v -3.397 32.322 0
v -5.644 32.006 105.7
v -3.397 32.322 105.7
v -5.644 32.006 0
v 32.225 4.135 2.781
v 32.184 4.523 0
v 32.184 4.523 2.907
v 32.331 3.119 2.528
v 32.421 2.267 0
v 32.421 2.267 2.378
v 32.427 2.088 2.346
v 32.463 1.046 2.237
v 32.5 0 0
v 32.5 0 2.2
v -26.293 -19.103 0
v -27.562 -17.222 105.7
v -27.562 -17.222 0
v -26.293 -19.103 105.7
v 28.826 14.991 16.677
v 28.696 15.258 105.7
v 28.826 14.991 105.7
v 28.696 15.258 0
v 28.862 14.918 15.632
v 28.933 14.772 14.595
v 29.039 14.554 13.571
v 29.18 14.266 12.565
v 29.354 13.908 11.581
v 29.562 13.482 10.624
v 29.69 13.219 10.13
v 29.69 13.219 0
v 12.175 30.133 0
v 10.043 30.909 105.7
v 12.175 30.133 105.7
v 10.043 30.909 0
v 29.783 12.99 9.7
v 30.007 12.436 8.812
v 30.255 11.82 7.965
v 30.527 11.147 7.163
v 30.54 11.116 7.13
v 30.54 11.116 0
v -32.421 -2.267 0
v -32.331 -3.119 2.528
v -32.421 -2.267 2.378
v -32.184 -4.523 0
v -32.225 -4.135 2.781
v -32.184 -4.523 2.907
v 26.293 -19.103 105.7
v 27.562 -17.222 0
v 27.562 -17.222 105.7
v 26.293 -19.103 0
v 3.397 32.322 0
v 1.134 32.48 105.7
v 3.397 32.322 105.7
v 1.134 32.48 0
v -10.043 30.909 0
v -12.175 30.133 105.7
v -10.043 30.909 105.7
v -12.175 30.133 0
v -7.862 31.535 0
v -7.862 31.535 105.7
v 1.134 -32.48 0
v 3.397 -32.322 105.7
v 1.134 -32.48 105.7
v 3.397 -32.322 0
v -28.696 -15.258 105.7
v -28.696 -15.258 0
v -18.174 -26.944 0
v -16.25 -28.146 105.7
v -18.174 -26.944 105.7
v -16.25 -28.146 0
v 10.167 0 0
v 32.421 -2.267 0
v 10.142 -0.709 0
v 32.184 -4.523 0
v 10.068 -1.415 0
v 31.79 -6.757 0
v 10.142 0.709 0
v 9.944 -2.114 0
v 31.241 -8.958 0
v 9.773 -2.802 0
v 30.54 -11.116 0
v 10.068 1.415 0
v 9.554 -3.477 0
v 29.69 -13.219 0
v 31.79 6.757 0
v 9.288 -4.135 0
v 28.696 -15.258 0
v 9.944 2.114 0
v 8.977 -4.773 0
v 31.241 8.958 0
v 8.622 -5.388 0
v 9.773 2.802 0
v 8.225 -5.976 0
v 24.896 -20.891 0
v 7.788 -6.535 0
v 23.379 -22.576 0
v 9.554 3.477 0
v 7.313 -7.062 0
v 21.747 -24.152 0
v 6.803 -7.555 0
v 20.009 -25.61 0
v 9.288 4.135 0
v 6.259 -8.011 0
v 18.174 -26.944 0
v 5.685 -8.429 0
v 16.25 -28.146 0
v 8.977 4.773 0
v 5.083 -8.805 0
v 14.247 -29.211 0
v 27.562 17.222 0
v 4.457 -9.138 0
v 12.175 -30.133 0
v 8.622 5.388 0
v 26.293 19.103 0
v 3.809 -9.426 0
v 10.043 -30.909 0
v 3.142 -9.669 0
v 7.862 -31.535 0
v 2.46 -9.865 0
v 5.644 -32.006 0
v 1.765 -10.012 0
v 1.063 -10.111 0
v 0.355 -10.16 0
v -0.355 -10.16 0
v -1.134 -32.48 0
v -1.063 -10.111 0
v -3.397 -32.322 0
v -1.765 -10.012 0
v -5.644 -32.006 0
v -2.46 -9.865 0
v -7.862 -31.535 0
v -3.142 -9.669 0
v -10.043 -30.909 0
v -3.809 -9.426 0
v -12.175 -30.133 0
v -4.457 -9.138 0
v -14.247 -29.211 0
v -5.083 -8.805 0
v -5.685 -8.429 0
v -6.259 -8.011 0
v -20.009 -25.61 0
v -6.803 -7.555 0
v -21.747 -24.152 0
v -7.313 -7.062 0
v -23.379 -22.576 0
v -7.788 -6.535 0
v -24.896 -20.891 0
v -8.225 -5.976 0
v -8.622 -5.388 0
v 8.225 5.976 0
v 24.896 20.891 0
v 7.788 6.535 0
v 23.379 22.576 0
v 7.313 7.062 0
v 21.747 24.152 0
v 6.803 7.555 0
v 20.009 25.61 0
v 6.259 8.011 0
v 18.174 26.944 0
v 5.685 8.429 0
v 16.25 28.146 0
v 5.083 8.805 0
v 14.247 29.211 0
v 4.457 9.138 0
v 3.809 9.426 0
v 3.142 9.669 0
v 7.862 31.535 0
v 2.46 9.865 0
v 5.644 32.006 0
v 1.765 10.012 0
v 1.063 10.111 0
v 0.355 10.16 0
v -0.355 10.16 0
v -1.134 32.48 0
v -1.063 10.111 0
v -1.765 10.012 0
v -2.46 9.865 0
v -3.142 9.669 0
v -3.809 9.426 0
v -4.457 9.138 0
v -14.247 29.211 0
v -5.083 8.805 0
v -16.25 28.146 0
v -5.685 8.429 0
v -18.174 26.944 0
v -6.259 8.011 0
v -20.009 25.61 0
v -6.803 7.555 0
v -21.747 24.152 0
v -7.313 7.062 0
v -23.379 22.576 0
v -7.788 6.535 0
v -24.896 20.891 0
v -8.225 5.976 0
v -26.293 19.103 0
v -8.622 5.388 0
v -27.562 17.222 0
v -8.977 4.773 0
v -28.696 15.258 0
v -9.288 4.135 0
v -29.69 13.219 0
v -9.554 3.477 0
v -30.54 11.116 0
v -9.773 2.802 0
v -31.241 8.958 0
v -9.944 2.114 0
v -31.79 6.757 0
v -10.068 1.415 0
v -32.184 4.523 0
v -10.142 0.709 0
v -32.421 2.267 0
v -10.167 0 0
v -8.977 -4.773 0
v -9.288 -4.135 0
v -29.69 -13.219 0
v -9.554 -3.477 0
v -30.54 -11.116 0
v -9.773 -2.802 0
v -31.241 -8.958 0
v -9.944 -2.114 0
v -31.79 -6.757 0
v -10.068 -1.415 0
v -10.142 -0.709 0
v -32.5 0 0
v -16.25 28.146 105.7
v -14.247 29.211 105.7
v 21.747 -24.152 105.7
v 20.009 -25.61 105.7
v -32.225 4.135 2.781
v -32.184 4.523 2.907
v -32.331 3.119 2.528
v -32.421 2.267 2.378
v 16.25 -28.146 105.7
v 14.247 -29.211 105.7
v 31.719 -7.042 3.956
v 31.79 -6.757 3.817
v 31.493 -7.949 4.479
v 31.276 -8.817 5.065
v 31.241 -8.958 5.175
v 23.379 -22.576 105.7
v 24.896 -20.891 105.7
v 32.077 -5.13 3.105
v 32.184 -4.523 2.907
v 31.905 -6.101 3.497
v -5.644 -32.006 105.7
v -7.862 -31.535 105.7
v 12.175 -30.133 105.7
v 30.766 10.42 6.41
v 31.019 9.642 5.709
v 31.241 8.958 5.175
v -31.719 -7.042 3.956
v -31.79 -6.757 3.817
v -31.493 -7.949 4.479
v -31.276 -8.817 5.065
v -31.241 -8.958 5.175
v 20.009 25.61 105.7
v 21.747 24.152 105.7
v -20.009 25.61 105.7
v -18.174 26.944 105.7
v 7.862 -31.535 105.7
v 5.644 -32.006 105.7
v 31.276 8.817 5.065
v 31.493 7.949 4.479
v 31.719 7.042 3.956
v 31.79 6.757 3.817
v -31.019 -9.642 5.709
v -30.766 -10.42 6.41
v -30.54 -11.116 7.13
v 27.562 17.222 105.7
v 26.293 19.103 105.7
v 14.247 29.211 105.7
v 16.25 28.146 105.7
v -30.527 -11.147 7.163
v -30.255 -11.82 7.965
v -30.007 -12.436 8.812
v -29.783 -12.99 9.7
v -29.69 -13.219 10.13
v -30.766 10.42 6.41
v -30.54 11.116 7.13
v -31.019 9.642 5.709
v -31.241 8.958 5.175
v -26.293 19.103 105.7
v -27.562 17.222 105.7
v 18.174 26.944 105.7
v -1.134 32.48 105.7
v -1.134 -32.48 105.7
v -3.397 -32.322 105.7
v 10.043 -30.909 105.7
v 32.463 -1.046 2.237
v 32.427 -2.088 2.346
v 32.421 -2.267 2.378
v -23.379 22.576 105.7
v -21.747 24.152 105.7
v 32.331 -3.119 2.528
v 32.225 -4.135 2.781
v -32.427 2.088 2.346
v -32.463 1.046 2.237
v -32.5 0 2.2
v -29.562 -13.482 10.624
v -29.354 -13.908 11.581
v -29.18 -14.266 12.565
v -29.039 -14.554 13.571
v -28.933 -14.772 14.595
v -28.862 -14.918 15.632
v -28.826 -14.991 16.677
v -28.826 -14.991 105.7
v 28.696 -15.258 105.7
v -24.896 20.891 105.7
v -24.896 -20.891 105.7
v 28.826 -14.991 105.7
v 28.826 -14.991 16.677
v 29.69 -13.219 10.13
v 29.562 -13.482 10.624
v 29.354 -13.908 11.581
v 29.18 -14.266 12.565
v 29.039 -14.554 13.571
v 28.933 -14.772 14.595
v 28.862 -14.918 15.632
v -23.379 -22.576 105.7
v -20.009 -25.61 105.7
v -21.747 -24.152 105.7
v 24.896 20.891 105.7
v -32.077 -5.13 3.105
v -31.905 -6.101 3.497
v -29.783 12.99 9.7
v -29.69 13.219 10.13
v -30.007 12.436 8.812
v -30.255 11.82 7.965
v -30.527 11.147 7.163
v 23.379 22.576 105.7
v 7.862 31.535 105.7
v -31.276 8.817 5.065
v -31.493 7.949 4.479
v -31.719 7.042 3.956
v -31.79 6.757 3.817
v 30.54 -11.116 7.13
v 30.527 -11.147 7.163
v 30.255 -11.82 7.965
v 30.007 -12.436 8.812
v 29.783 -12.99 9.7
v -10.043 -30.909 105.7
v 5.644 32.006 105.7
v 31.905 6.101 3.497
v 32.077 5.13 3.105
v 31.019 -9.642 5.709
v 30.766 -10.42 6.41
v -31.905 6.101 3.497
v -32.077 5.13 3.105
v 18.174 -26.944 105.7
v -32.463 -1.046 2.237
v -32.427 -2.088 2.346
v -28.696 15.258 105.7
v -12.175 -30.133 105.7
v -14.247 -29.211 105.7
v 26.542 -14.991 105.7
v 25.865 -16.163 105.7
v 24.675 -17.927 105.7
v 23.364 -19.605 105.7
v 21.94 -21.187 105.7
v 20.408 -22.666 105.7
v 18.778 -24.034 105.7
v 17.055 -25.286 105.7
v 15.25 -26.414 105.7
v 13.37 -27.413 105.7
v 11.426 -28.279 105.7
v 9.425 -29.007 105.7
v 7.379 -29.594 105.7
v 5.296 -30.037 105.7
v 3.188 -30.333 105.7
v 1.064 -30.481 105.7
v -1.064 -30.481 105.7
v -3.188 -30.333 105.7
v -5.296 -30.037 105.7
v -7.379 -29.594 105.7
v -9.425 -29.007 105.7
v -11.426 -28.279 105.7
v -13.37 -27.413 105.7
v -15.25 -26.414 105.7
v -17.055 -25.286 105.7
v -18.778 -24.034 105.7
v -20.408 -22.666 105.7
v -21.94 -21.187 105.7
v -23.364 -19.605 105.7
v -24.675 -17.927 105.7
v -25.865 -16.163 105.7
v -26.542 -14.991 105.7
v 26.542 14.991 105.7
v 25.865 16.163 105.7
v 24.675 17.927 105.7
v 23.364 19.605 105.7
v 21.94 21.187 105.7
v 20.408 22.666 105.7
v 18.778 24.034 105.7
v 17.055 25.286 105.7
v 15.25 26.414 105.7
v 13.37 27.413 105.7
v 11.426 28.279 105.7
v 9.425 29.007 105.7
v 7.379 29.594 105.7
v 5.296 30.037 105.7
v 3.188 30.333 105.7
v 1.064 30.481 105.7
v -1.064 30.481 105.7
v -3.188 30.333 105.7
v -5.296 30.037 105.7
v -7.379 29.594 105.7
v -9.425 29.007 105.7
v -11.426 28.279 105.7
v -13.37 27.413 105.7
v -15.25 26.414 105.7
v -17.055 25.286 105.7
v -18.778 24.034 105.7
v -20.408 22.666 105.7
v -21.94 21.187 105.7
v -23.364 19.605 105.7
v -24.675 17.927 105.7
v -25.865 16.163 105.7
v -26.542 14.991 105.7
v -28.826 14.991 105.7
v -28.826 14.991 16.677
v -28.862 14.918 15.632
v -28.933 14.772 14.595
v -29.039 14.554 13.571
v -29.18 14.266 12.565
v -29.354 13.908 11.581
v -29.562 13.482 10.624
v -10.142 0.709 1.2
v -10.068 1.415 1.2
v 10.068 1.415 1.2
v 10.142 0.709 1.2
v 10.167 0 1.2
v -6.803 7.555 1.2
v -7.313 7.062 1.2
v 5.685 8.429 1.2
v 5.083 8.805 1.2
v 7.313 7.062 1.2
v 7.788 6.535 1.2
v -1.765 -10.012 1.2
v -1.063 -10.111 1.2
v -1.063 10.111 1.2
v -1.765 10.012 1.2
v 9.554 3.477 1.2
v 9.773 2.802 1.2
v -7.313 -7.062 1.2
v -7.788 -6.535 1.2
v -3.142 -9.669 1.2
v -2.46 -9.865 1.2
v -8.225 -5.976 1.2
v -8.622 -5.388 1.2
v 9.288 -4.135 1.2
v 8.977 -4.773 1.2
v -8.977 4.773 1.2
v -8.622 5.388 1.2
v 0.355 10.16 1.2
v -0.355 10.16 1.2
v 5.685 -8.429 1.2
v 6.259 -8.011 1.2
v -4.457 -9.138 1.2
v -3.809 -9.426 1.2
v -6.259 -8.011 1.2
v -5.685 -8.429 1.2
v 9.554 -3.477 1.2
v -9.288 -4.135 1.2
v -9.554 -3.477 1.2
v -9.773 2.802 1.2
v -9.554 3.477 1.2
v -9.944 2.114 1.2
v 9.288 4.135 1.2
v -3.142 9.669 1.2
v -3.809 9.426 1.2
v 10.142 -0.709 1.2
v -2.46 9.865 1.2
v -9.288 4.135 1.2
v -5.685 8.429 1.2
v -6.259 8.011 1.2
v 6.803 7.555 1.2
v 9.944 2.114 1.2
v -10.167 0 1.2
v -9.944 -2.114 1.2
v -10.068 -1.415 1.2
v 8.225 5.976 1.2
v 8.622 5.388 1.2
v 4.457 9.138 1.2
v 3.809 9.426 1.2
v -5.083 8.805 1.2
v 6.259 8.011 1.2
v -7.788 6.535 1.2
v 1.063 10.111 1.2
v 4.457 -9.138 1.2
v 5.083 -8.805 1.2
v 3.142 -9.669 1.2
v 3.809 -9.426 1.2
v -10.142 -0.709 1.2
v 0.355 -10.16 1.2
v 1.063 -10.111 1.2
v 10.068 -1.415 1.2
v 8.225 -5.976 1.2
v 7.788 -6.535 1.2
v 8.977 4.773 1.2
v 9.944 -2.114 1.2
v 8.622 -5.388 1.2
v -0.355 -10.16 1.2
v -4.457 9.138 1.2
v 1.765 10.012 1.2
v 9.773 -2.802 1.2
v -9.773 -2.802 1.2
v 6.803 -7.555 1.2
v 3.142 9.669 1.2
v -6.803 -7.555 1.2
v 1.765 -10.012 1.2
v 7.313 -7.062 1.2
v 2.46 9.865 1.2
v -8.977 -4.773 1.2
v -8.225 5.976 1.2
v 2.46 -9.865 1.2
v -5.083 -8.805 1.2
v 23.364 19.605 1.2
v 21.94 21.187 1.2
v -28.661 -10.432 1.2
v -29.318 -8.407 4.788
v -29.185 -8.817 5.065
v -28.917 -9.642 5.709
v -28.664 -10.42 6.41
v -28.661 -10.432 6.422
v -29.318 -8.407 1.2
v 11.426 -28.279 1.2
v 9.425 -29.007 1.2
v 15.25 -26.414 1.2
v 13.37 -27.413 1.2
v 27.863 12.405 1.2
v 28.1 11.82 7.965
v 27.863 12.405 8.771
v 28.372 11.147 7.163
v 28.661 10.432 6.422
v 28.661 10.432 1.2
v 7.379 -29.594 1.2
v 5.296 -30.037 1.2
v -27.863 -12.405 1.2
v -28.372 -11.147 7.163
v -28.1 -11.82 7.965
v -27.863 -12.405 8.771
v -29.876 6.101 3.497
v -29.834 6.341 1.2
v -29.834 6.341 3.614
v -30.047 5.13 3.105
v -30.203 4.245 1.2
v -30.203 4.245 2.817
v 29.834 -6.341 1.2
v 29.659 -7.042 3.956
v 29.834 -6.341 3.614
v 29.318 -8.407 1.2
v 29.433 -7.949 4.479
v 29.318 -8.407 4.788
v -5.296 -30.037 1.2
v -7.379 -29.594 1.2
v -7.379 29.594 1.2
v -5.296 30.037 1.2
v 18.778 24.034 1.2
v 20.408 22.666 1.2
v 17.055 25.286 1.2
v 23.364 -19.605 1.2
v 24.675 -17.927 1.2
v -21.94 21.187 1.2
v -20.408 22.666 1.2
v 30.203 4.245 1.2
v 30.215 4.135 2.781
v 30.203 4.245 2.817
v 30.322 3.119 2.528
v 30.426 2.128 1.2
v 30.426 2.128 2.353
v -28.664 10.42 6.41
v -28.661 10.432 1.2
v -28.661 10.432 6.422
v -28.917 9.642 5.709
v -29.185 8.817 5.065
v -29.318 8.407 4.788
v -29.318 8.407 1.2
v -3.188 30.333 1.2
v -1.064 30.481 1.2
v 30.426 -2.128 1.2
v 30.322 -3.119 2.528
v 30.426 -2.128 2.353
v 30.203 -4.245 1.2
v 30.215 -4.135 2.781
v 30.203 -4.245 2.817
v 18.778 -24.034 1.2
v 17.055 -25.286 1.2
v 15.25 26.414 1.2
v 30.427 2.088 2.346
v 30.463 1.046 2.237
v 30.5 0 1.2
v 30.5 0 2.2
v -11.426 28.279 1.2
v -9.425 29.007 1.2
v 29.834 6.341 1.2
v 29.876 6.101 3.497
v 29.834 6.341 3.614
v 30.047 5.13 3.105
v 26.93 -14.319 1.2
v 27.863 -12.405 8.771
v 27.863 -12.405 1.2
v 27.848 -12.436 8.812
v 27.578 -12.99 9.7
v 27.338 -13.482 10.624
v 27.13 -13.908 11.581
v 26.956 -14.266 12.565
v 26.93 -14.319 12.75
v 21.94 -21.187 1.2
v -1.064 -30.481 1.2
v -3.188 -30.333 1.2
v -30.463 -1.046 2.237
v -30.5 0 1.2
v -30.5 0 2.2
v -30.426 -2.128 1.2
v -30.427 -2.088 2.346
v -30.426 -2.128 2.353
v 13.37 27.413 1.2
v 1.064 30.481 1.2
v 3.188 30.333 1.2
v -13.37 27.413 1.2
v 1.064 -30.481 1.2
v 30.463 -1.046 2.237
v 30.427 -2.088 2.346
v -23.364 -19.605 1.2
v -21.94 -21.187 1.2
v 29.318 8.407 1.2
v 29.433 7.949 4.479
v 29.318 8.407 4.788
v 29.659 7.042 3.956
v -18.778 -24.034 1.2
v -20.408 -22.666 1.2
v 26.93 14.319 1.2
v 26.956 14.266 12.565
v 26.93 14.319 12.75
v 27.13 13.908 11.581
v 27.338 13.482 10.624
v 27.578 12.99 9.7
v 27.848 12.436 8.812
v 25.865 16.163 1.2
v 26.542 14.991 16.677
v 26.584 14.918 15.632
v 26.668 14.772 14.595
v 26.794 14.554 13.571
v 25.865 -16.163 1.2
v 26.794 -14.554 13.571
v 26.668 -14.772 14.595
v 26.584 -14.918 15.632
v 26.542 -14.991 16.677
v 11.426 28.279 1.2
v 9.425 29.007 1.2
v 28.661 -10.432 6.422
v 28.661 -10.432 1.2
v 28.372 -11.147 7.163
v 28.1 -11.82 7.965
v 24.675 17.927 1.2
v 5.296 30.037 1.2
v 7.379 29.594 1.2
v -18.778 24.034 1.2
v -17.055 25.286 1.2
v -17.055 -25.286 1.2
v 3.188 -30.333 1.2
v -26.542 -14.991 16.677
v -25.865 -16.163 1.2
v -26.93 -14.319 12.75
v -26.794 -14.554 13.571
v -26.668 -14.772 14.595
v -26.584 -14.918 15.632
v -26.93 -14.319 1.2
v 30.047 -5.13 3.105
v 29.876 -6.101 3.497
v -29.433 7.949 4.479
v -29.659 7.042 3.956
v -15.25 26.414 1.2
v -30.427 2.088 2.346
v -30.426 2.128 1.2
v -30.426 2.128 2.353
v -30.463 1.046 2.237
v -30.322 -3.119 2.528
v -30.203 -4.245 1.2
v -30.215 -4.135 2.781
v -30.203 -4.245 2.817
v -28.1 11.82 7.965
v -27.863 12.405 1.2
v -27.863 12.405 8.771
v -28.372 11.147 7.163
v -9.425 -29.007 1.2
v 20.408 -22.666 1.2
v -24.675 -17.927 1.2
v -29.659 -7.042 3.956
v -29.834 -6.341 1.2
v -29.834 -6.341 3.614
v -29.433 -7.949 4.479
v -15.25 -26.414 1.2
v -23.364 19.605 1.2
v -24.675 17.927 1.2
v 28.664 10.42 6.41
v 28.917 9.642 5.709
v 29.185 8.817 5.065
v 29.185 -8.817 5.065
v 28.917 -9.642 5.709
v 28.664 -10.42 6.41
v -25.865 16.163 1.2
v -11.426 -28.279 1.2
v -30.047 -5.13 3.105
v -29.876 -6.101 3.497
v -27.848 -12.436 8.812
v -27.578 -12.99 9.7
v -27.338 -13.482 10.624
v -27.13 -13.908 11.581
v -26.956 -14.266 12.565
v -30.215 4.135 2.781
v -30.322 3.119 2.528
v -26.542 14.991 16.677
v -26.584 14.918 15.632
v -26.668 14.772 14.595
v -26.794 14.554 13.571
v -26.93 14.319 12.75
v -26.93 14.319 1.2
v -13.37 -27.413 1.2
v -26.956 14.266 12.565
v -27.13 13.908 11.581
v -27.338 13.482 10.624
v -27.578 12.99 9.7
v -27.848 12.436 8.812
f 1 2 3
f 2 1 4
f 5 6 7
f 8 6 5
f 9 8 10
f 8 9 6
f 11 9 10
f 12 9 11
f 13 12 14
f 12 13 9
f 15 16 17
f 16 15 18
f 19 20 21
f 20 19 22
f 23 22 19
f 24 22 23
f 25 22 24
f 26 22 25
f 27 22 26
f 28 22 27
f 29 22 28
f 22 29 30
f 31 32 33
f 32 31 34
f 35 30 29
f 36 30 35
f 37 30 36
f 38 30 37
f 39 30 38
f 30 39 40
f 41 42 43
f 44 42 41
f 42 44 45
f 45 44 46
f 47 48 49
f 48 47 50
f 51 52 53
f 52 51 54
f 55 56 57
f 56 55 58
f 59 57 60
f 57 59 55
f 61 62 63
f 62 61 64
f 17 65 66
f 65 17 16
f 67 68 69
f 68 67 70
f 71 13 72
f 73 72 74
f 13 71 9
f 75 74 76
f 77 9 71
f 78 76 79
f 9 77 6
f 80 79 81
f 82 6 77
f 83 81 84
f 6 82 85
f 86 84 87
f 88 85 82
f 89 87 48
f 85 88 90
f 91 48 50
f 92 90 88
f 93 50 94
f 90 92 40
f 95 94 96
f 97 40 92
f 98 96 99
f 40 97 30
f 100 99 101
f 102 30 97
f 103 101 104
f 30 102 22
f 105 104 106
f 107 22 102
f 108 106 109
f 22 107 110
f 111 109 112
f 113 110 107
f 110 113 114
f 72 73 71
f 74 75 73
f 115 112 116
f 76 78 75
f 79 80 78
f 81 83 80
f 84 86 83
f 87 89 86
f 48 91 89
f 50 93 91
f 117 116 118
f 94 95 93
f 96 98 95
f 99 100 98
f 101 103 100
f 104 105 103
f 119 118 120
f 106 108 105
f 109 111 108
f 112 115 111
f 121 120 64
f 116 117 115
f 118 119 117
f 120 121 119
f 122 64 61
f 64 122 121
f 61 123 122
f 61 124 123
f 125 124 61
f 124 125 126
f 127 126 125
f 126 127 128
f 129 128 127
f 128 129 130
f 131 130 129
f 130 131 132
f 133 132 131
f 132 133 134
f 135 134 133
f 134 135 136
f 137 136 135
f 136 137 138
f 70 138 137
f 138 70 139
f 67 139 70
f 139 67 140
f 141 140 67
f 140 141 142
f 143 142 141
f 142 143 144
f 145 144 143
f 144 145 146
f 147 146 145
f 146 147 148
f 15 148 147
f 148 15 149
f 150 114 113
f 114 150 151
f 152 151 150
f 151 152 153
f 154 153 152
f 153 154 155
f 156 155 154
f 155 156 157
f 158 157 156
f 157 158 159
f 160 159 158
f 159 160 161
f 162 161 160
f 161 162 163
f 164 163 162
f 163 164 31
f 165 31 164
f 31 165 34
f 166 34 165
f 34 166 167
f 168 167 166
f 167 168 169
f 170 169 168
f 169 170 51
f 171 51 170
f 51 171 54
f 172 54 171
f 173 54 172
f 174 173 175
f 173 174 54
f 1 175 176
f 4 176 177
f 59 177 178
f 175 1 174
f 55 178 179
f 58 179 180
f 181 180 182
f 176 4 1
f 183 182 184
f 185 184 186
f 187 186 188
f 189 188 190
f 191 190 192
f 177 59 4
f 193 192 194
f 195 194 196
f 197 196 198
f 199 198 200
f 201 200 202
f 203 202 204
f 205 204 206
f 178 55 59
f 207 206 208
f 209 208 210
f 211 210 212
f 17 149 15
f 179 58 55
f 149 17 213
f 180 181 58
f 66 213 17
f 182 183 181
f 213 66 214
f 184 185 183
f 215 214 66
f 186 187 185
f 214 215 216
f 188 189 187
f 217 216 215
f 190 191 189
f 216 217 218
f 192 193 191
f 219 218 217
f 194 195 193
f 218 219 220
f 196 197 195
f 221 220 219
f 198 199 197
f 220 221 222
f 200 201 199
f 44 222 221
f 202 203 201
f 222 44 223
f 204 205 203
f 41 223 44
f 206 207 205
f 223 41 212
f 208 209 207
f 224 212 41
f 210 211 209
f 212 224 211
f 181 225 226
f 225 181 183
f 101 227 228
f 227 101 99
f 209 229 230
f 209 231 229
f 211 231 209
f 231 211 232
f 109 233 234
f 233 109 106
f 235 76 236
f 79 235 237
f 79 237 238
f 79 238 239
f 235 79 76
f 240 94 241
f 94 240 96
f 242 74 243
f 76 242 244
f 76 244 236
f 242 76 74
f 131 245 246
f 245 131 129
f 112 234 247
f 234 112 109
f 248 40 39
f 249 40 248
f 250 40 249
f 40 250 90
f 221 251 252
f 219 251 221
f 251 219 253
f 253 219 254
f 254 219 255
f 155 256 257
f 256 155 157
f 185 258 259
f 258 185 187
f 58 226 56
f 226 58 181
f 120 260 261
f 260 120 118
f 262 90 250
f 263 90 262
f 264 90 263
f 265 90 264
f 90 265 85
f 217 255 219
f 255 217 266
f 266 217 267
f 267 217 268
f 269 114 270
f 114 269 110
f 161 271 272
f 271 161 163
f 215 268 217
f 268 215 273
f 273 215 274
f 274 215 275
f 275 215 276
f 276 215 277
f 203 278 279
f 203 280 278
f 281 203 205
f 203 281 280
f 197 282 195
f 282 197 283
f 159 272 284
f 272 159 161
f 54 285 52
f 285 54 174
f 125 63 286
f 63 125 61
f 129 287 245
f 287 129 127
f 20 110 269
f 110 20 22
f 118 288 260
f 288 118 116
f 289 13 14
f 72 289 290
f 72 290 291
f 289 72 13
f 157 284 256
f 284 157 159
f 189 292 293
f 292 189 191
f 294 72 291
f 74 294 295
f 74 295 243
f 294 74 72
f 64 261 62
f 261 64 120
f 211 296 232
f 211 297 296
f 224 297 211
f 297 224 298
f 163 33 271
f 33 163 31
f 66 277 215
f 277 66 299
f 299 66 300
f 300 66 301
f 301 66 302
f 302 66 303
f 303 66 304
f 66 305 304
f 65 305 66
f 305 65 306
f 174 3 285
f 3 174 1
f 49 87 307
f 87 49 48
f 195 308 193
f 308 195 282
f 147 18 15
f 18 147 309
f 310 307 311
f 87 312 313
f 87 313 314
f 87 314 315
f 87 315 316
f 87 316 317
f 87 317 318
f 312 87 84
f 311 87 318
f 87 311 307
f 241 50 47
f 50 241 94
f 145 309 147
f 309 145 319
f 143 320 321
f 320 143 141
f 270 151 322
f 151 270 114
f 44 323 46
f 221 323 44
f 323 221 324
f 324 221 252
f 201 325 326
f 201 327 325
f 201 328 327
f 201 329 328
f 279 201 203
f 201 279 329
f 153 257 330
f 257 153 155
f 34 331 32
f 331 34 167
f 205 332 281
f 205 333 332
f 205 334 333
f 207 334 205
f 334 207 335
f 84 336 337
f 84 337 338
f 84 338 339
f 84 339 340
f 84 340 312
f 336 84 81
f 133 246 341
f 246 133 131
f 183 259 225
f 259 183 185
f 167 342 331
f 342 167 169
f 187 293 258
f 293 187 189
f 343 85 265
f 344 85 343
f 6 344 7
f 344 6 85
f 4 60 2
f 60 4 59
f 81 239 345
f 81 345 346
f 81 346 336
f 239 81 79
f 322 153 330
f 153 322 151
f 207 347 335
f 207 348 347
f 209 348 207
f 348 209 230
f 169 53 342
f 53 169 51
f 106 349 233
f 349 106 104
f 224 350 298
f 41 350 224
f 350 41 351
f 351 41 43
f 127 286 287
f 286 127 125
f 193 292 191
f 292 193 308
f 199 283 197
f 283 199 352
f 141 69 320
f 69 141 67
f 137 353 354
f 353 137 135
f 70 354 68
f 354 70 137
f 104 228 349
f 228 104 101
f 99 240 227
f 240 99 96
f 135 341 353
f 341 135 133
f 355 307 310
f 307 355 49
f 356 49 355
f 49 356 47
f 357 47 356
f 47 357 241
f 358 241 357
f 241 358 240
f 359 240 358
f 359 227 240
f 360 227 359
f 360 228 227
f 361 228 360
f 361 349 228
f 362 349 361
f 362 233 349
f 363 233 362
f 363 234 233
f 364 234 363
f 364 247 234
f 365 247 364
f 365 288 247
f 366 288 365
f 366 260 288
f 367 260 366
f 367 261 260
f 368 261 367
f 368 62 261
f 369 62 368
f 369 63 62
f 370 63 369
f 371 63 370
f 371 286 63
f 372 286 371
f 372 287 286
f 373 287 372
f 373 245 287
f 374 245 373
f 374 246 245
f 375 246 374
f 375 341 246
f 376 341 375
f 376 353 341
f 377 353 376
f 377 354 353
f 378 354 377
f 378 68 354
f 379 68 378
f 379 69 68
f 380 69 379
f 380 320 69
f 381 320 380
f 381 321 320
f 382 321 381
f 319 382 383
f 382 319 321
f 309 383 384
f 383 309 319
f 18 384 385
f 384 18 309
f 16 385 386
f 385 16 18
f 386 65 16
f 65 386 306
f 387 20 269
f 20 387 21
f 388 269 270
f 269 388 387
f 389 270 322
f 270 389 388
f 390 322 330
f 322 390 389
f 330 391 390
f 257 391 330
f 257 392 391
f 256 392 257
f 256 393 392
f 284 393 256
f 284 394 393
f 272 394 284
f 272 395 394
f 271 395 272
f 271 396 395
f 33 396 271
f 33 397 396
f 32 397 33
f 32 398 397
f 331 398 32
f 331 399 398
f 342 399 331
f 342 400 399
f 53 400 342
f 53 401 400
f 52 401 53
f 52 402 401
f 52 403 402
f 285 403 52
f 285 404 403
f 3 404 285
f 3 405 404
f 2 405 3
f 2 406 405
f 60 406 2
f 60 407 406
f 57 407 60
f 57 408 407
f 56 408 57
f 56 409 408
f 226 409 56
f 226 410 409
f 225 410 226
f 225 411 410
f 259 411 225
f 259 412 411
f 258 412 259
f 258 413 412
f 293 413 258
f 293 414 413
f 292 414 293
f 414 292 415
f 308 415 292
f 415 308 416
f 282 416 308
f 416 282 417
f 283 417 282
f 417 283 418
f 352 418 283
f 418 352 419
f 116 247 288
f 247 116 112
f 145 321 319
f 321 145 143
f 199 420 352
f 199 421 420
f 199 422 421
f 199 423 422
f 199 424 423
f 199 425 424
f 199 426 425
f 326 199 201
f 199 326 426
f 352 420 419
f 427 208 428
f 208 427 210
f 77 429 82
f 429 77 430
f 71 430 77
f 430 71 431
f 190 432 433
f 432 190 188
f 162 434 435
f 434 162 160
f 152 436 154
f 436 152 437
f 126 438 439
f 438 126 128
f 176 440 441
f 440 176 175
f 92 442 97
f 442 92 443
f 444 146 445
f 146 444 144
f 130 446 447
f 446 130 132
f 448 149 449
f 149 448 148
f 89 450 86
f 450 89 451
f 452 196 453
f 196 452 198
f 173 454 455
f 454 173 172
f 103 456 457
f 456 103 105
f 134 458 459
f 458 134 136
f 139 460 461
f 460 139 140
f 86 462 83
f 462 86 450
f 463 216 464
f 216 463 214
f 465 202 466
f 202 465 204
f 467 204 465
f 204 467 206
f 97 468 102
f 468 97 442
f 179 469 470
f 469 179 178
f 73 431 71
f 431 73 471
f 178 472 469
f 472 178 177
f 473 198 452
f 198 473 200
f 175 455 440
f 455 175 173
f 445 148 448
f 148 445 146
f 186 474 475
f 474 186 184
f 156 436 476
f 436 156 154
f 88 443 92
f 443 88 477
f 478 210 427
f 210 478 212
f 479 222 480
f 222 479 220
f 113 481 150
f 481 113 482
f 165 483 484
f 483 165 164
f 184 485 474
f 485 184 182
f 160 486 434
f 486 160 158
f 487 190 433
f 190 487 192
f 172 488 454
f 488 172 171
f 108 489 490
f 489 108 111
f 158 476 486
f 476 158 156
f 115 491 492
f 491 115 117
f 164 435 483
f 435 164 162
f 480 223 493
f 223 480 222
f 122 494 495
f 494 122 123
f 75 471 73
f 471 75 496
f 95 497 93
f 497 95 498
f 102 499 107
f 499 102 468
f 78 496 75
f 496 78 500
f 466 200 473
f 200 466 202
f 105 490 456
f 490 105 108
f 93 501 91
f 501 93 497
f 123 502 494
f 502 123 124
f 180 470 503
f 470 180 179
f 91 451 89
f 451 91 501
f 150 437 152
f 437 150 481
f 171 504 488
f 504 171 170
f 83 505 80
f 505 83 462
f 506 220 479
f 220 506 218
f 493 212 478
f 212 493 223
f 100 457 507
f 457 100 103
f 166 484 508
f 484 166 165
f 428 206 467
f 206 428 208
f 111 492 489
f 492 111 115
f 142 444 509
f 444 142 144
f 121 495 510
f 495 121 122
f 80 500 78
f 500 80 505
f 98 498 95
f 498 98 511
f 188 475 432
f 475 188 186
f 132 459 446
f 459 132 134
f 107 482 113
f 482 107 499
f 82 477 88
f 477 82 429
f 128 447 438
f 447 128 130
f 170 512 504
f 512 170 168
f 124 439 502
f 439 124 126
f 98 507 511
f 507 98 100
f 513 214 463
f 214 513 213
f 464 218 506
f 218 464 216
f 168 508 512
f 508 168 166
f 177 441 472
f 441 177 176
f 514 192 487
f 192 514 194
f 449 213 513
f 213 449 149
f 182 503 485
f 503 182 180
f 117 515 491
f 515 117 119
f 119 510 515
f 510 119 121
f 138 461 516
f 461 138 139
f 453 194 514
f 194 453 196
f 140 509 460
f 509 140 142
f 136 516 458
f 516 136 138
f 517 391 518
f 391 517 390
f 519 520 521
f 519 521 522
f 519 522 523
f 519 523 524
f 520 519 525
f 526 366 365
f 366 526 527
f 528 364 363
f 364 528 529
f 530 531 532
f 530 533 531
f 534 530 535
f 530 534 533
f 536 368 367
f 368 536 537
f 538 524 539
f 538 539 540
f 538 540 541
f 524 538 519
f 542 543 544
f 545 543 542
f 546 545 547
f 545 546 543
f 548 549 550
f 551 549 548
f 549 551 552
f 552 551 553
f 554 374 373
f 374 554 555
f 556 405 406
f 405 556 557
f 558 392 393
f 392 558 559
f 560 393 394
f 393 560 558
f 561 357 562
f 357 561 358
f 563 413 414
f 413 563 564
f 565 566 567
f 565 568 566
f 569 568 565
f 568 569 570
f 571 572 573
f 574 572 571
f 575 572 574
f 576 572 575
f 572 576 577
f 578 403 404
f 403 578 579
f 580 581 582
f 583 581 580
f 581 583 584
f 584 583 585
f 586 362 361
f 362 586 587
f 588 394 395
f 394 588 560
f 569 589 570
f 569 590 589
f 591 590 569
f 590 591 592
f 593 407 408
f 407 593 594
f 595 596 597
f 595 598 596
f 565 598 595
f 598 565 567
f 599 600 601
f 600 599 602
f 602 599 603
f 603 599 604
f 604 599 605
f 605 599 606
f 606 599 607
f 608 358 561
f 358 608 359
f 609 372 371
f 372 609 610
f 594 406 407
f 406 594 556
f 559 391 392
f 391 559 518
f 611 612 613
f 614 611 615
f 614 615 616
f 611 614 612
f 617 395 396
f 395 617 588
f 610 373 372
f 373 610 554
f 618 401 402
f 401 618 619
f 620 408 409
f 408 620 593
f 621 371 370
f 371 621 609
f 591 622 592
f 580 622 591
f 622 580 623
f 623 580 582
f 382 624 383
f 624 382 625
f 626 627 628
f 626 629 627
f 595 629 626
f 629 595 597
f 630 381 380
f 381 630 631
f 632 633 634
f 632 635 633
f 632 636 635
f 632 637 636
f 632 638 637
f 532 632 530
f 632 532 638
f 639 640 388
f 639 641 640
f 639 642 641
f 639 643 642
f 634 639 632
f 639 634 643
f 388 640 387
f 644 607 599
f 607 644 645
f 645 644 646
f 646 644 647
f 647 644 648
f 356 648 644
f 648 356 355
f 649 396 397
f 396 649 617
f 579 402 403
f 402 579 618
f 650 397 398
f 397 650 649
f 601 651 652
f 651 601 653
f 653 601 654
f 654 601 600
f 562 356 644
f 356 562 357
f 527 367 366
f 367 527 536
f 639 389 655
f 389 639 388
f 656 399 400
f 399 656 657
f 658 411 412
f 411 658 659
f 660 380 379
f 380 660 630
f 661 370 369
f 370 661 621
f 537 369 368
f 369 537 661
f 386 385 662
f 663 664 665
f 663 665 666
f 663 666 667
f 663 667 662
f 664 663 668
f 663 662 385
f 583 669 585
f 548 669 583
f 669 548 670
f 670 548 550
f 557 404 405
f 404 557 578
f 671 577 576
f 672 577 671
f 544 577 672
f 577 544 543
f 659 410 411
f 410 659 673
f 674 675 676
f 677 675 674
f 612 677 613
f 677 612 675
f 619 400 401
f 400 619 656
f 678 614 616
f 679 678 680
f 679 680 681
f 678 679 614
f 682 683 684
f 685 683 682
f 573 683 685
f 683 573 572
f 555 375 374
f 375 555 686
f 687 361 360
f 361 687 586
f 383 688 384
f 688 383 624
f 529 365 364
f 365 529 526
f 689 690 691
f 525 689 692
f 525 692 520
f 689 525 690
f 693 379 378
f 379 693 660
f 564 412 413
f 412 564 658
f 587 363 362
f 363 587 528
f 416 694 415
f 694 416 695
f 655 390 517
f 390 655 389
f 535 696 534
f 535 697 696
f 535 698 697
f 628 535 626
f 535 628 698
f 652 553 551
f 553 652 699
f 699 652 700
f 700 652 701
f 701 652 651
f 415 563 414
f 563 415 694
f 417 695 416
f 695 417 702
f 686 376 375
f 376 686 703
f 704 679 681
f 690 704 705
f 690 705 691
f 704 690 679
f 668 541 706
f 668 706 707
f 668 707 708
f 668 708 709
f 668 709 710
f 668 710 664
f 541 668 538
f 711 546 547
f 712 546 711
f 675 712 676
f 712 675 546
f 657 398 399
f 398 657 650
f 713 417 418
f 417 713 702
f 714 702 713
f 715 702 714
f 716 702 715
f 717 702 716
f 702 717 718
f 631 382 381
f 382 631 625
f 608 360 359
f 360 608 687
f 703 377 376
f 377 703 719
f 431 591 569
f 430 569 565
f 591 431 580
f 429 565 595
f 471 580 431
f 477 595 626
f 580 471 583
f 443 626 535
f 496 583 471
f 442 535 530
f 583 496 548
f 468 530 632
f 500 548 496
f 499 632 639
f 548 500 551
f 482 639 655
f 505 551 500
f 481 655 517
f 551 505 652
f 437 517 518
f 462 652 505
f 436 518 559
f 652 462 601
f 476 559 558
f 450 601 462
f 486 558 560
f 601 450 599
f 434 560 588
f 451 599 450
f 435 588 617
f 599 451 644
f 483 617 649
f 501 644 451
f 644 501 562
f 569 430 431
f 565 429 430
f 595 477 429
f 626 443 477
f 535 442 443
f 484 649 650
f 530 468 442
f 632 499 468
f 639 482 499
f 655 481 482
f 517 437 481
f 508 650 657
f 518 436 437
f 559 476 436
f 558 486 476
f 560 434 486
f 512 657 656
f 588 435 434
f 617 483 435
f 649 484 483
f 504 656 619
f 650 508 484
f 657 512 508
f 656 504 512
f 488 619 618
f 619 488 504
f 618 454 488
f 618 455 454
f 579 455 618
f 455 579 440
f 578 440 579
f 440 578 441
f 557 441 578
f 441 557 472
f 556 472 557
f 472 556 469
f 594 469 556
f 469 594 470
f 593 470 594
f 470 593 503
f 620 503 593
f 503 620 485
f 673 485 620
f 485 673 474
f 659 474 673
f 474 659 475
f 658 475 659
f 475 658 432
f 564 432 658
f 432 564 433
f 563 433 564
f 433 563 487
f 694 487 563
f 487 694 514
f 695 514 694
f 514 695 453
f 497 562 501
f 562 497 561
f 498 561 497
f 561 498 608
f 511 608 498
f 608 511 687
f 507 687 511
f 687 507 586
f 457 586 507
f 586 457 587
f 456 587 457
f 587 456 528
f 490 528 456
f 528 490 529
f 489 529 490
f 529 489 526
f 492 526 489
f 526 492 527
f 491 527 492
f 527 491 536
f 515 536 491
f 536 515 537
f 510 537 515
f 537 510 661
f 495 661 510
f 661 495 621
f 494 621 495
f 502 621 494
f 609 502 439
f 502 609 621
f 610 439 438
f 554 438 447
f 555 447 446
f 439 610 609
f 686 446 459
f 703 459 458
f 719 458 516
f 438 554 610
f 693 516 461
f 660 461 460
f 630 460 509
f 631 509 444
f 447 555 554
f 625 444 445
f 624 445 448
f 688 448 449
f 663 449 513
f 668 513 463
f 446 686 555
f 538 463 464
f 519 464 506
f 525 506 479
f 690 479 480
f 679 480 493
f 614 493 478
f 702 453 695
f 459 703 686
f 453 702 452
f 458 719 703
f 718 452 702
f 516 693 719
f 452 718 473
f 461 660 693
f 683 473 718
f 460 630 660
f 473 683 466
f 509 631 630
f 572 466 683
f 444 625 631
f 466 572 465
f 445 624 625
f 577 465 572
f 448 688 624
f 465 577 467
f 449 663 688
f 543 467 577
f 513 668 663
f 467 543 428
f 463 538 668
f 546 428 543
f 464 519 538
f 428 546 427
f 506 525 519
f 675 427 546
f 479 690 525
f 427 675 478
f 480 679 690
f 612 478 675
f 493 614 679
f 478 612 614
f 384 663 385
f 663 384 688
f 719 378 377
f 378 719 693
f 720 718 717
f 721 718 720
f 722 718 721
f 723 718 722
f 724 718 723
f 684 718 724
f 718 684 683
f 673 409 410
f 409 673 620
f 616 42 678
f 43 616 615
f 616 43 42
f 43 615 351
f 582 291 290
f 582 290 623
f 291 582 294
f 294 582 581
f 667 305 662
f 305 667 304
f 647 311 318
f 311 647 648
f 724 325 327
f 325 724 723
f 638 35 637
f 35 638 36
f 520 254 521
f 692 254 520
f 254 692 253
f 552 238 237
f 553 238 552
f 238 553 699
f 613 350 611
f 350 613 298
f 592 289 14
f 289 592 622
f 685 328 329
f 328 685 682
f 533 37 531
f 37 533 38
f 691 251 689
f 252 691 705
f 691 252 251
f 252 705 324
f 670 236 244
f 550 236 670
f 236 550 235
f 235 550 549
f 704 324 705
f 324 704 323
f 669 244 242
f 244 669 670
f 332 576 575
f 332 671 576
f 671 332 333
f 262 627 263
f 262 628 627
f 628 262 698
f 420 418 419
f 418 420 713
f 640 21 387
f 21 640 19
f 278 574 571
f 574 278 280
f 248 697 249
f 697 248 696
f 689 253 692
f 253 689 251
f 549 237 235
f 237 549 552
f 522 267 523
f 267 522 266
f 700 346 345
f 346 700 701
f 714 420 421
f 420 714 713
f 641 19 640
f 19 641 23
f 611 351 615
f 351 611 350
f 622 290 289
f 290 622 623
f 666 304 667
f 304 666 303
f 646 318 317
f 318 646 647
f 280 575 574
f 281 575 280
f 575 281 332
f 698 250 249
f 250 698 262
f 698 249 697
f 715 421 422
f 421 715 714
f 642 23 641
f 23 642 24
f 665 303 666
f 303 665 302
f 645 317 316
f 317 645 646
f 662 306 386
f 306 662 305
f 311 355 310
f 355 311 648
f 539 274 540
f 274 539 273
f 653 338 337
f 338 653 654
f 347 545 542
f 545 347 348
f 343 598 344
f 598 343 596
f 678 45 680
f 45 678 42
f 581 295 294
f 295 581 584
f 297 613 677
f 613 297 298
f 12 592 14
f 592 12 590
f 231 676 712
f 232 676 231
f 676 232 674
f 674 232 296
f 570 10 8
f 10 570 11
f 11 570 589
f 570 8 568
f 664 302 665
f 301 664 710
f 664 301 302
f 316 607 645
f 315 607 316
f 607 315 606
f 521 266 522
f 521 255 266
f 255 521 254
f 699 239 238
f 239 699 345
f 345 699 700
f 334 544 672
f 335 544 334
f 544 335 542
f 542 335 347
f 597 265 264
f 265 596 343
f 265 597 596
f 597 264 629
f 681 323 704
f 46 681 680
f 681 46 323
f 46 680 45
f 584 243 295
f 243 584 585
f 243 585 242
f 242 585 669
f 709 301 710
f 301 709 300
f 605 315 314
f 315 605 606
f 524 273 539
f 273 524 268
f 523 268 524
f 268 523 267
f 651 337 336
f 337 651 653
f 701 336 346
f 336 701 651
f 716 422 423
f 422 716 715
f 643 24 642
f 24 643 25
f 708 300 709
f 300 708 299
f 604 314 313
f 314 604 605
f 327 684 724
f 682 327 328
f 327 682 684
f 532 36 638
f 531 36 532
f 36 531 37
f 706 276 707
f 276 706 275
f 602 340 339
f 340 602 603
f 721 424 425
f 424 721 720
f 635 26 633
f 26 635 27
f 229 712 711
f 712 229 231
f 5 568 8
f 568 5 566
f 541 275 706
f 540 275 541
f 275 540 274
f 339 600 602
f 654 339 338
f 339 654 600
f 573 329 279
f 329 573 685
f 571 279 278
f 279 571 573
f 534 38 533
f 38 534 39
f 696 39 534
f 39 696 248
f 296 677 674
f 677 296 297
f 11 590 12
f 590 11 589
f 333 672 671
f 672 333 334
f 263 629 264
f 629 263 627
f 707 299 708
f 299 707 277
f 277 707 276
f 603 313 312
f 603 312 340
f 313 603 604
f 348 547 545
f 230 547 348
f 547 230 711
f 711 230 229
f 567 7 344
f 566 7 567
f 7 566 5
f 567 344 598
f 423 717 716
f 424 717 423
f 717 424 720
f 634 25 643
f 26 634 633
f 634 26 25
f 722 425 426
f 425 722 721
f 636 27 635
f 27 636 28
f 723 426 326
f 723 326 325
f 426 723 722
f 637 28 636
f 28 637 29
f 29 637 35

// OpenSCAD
// Inner diameter of the cylinder
innerDiameter = 61.0;
innerRadius = innerDiameter / 2.0;

// Height of cylinder base
baseHeight = 1.2;

// Height of each item being put in the stack
itemHeight = 9.5;
// Number of items to put in the stack
itemCount = 11;

// Wall thickness
wallThickness = 2.0;

$fn=90;
difference() {
    union() {
        cylinder(h=(itemHeight*itemCount) + baseHeight,
                 r=(innerRadius + wallThickness)
        );
    }
    
    // Bottom finger hole
    translate([0,0,-0.1])
        cylinder(h=baseHeight+0.2,d=innerDiameter/3);
    
    // Inner cylinder
    translate([0,0,baseHeight]) cylinder(h=(itemHeight*itemCount)+0.1,r=innerRadius);
    
    // Rounded cutouts
    rotate([0,90,0])
        translate([-(itemHeight*itemCount)-15-baseHeight-1,0,-innerDiameter*0.75])      hull() {
            cylinder(h=innerDiameter*1.5,d=30);
            translate([itemHeight*itemCount,0,0])
                cylinder(h=innerDiameter*1.5,d=30);
          }
}
